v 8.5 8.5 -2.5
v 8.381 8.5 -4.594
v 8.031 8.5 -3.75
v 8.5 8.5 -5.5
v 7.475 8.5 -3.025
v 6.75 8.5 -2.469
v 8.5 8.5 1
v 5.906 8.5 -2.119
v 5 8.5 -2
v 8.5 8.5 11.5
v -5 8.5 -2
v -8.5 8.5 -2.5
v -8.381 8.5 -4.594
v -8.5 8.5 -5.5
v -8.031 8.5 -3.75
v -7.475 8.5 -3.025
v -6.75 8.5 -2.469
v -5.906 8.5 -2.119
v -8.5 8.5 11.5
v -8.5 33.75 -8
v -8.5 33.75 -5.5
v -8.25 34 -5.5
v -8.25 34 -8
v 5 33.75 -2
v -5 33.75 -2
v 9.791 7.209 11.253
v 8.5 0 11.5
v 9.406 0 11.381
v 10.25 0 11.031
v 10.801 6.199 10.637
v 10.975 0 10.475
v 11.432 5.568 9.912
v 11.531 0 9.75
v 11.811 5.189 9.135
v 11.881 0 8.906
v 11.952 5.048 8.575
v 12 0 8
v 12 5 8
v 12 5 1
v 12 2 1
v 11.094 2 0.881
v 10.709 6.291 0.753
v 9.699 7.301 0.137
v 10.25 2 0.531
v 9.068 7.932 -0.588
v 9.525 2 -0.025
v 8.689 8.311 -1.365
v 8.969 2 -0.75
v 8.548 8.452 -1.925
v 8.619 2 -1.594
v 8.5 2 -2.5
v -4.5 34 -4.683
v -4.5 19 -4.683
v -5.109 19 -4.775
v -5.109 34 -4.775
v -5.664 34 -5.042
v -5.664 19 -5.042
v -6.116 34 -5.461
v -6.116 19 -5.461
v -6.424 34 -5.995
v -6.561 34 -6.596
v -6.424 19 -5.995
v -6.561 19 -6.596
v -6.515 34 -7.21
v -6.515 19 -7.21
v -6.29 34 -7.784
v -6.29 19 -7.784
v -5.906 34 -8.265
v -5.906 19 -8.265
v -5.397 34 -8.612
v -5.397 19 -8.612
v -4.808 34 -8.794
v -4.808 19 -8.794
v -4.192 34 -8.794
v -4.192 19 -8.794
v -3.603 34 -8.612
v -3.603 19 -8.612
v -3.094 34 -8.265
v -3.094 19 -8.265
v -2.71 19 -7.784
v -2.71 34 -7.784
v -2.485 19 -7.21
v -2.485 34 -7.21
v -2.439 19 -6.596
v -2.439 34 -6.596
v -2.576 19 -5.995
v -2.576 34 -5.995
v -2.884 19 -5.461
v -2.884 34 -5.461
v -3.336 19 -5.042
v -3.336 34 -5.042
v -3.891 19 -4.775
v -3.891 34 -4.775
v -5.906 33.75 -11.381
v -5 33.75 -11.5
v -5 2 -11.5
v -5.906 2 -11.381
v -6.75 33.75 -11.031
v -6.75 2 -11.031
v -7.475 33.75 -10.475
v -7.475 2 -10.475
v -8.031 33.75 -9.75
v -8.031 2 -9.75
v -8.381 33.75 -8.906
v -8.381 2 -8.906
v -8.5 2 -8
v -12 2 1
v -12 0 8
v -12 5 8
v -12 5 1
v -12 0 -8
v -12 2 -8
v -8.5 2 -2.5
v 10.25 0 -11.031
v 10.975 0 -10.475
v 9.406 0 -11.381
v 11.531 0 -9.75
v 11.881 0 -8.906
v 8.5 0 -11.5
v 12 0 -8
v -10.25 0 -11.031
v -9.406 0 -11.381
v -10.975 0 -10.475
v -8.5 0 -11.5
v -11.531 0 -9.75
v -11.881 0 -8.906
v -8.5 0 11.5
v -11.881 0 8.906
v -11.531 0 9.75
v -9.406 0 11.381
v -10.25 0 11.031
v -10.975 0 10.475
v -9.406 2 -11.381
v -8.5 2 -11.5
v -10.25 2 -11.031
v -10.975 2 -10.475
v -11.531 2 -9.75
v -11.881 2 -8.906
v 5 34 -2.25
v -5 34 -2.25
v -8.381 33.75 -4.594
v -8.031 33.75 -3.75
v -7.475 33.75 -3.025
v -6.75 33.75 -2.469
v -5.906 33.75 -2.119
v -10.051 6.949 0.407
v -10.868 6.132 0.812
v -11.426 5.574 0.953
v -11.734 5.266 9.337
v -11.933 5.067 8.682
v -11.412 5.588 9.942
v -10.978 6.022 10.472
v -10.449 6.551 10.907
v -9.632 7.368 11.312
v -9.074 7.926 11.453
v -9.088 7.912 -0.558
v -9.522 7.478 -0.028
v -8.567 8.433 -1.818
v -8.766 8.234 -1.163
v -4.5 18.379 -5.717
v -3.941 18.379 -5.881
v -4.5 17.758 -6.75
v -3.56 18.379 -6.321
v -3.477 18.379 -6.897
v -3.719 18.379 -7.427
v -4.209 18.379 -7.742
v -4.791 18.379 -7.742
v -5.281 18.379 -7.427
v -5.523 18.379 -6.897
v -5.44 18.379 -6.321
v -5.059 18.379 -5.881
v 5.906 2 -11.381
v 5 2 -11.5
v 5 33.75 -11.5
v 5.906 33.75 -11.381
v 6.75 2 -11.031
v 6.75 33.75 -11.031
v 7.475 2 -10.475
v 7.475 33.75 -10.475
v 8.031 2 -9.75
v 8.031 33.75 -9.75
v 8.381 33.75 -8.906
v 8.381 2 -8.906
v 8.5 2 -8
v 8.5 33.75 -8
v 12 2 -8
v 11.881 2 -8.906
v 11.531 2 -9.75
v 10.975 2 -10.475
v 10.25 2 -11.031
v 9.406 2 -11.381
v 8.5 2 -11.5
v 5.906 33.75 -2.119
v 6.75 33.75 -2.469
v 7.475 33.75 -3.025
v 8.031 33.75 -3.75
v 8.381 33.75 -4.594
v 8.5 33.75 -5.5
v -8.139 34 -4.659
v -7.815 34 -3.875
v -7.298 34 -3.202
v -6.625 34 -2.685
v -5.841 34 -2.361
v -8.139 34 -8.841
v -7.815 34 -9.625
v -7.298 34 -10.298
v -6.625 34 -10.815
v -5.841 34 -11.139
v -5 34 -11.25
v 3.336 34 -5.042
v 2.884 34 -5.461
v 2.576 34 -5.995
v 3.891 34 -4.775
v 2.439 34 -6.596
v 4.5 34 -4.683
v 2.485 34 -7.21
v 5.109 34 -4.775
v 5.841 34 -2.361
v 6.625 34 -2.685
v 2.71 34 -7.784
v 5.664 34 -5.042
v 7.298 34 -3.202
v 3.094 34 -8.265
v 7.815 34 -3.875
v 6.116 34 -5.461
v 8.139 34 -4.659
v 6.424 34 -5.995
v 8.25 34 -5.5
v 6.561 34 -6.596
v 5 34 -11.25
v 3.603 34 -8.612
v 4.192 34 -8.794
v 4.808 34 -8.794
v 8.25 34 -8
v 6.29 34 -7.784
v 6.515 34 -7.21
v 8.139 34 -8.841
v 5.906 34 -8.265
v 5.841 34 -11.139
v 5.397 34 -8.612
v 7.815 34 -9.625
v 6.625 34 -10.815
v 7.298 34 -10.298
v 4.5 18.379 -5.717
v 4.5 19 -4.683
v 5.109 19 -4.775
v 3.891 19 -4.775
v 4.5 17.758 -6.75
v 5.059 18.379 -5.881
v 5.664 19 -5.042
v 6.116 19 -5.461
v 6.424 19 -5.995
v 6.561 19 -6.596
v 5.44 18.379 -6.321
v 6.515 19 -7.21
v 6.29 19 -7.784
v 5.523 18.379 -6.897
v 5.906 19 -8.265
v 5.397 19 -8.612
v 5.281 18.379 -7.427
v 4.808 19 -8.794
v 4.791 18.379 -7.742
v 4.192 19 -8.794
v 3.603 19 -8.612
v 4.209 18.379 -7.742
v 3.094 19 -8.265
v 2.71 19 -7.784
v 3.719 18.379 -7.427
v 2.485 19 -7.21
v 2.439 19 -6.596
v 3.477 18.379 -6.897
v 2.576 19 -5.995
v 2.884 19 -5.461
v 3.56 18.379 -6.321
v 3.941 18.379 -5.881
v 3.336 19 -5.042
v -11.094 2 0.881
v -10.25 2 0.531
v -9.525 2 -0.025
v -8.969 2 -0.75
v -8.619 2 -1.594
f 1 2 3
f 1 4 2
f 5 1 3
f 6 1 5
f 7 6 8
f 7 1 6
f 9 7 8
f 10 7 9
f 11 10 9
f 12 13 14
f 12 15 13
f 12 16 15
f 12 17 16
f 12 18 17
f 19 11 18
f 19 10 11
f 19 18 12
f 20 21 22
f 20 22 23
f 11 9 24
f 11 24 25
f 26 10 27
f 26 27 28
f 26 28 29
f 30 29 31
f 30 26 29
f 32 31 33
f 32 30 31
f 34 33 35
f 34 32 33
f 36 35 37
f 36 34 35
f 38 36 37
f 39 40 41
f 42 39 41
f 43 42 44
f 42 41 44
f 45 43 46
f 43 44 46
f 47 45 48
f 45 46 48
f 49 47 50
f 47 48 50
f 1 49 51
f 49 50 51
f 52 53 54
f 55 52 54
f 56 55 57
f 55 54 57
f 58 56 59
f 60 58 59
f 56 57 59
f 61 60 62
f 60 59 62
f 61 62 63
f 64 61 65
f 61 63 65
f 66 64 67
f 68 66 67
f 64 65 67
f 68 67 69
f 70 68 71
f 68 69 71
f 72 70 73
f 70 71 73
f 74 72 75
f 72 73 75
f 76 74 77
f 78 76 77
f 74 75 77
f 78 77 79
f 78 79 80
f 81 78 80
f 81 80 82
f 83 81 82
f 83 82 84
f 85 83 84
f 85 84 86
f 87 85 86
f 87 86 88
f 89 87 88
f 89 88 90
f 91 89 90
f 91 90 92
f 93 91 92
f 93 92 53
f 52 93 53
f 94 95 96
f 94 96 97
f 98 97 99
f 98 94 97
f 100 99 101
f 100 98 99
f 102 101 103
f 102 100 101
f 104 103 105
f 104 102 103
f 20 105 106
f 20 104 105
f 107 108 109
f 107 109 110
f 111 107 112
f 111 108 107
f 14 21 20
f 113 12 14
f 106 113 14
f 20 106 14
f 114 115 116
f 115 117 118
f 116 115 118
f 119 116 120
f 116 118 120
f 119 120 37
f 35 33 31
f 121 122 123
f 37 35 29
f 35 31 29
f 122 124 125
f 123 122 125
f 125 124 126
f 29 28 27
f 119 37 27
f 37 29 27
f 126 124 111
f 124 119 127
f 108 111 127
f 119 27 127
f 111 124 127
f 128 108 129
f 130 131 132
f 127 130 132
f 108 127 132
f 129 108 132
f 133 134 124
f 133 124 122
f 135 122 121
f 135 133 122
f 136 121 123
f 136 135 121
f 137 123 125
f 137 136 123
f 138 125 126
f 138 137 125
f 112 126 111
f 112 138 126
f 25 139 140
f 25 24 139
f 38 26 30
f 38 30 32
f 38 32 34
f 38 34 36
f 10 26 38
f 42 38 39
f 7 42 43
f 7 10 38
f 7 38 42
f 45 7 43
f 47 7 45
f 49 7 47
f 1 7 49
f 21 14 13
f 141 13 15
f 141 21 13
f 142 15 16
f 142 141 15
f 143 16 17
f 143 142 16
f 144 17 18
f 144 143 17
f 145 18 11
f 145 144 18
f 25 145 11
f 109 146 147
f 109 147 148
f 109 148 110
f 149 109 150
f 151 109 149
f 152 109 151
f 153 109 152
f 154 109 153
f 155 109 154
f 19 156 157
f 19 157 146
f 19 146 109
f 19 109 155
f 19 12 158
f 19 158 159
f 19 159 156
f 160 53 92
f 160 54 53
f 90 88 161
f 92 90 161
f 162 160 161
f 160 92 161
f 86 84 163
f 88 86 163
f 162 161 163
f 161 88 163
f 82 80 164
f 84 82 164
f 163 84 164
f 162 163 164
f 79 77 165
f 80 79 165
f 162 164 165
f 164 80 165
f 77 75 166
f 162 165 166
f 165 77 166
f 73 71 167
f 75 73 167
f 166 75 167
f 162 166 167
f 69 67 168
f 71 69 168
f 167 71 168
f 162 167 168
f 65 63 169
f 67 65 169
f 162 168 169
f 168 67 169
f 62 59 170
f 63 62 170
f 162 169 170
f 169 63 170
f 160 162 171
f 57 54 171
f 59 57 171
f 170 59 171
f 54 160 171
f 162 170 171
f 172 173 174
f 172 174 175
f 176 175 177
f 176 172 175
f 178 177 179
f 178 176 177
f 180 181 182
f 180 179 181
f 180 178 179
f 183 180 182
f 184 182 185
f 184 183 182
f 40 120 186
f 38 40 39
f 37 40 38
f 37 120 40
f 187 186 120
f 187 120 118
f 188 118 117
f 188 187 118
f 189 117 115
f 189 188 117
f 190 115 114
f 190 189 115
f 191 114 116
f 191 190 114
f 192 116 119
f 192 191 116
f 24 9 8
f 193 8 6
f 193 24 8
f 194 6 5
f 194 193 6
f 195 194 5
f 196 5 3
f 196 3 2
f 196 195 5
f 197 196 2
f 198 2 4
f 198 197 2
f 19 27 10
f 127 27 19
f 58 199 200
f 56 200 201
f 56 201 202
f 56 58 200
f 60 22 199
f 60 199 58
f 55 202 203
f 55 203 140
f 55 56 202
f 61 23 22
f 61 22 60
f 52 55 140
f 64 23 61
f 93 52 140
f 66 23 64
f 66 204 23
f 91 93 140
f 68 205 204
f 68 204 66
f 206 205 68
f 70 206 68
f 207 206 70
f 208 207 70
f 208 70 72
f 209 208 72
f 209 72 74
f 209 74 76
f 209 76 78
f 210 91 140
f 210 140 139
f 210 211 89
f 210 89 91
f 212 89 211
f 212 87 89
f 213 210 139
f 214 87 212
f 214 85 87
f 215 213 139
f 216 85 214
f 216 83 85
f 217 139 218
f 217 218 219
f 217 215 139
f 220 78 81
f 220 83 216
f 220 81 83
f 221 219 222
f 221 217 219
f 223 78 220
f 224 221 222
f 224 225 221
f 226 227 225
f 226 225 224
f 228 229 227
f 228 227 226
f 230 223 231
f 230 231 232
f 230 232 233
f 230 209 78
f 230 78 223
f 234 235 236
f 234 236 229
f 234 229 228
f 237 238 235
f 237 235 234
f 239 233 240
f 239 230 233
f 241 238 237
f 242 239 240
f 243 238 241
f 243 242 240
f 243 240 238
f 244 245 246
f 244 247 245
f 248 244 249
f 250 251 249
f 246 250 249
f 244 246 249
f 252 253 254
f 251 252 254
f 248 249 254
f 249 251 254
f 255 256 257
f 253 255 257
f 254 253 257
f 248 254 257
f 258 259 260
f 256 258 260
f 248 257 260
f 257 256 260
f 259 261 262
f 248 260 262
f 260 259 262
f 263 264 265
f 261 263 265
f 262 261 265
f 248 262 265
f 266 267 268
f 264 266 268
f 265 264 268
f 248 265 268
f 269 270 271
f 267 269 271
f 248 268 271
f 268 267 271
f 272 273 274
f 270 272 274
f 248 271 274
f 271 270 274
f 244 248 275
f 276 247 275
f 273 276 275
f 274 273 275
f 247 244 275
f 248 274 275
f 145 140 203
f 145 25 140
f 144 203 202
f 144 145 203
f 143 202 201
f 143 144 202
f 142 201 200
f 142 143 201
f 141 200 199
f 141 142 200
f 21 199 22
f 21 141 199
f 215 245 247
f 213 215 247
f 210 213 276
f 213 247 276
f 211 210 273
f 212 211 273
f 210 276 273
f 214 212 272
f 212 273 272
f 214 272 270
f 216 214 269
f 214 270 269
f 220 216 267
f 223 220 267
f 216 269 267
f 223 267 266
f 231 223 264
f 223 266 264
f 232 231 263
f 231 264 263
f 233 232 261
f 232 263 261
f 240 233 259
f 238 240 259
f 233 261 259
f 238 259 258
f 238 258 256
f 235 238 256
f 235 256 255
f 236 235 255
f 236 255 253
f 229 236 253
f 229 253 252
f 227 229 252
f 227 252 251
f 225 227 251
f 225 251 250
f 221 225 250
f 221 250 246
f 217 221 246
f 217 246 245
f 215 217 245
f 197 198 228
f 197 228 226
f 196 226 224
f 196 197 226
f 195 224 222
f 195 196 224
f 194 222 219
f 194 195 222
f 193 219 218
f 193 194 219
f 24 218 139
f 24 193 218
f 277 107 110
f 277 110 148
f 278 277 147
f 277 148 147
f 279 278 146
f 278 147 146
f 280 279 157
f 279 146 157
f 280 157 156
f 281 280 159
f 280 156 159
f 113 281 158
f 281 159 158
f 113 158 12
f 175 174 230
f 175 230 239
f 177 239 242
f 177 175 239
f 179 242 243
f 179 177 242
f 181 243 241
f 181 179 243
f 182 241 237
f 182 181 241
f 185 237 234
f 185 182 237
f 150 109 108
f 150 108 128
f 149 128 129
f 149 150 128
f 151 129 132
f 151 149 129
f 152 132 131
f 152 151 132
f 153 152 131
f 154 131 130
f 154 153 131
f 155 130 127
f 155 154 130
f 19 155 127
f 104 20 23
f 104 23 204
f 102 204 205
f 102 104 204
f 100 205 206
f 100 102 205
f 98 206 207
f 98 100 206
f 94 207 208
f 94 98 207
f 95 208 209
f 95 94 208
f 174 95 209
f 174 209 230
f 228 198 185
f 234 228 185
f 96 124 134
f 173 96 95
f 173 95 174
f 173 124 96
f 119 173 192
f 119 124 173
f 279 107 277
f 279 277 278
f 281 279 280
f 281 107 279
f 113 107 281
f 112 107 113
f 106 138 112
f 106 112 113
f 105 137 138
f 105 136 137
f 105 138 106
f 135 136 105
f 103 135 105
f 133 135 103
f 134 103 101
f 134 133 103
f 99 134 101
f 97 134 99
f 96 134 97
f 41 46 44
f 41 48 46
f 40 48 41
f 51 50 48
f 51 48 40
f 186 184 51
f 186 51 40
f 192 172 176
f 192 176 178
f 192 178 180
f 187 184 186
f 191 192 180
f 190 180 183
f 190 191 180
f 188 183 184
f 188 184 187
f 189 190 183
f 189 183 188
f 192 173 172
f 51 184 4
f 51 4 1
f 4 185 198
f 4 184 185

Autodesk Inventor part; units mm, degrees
ref_plane "YZ Plane" through (0, 0, 0) normal (1, 0, 0) x (0, 1, 0)
ref_plane "XZ Plane" through (0, 0, 0) normal (0, 1, 0) x (-1, 0, 0)
ref_plane "XY Plane" through (0, 0, 0) normal (0, 0, 1) x (1, 0, 0)
sketch "Base Outline" plane through (0, 0, 0) normal (0, 1, 0) x (-1, 0, 0)
  line L0 (12, -11.5) -> (-12, -11.5)
  line L1 (-12, -11.5) -> (-12, 11.5)
  line L2 (-12, 11.5) -> (12, 11.5)
  line L3 (12, 11.5) -> (12, -11.5)
  point P0 (0, 0)
  dimension "d0" = 23
  dimension "d1" = 11.5
  dimension "d2" = 24
  dimension "d3" = 12
extrude "Base" add sketch "Base Outline" along normal blind 8.5
sketch "Pillar Outline" plane through (0, 8.5, 0) normal (0, 1, 0) x (1, 0, 0)
  line L0 (-8.5, 11.5) -> (8.5, 11.5)
  line L1 (8.5, 11.5) -> (8.5, 2)
  line L2 (8.5, 2) -> (-8.5, 2)
  line L3 (-8.5, 2) -> (-8.5, 11.5)
  line L4 (12, 11.5) -> (-12, 11.5) projected
  point P0 (0, 0)
  dimension "d6" = 0
  dimension "d7" = 9.5
  dimension "d8" = 17
  dimension "d9" = 8.5
extrude "Pillar" add sketch "Pillar Outline" along normal blind 25.5
sketch "Base Cutouts Outline" plane through (0, 8.5, 0) normal (0, 1, 0) x (1, 0, 0)
  line L0 (-8.5, -1) -> (-12, -1)
  line L1 (-12, -1) -> (-12, 11.5)
  line L2 (-12, 11.5) -> (-8.5, 11.5)
  line L3 (-8.5, 11.5) -> (-8.5, -1)
  line L4 (8.5, -1) -> (12, -1)
  line L5 (12, -1) -> (12, 11.5)
  line L6 (12, 11.5) -> (8.5, 11.5)
  line L7 (8.5, 11.5) -> (8.5, -1)
  line L8 (-8.5, 11.5) -> (-12, 11.5) projected
  line L9 (-12, 11.5) -> (-12, -11.5) projected
  line L10 (-8.5, 11.5) -> (-8.5, 2) projected
  line L11 (8.5, 2) -> (8.5, 11.5) projected
  line L12 (12, 11.5) -> (8.5, 11.5) projected
  line L13 (12, -11.5) -> (12, 11.5) projected
  point P0 (0, 0)
  dimension "d12" = 0
  dimension "d13" = 0
  dimension "d14" = 0
  dimension "d15" = 12.5
  dimension "d16" = 0
  dimension "d17" = 0
  dimension "d18" = 0
  dimension "d19" = 12.5
extrude "Base Cutouts" cut sketch "Base Cutouts Outline" against normal blind 6.5
sketch "Hole Positions" plane through (0, 34, 0) normal (0, 1, 0) x (1, 0, 0)
  line L0 (8.5, 11.5) -> (-8.5, 11.5) projected
  point P0 (0, 0)
  point P1 (4.5, 6.75)
  point P2 (-4.5, 6.75)
  dimension "d22" = 4.75
  dimension "d23" = 4.5
  dimension "d24" = 4.5
  dimension "d25" = 4.75
hole "Holes" at (4.5, 34, -6.75) at (-4.5, 34, -6.75) direction (0, -1, 0) diameter 4.134 depth 15 tip angle 118 thread size "M5x0.8" class "6H" standard "ISO Metric profile"
chamfer "Base Chamfer" distance 3.5 angle 45 2 edges at (-12, 8.5, 6.25) (12, 8.5, 6.25)
fillet "Pillar Fillet" radius 3.5 10 edges at (-12, 1, -11.5) (-8.5, 18, -11.5) (-8.5, 21.25, -2) (8.5, 21.25, -2) (-8.5, 5.25, 1) (-12, 2.5, 11.5) (12, 2.5, 11.5) (8.5, 5.25, 1) (12, 1, -11.5) (8.5, 18, -11.5)
chamfer "Pillar Chamfer" distance 0.25 angle 45 8 edges at (-7.4749, 34, -3.0251) (-8.5, 34, -6.75) (-7.4749, 34, -10.4749) (0, 34, -11.5) (7.4749, 34, -10.4749) (8.5, 34, -6.75) (7.4749, 34, -3.0251) (0, 34, -2)
equation "\"d1\" = 0.5 * d0"
equation "\"d3\" = 0.5 * d2"
equation "\"d9\" = 0.5 * d8"
equation "\"d19\" = d15"
equation "\"d24\" = d23"
equation "\"d25\" = d22"
properties part number "LR Rail" material "Aluminum 6061"
